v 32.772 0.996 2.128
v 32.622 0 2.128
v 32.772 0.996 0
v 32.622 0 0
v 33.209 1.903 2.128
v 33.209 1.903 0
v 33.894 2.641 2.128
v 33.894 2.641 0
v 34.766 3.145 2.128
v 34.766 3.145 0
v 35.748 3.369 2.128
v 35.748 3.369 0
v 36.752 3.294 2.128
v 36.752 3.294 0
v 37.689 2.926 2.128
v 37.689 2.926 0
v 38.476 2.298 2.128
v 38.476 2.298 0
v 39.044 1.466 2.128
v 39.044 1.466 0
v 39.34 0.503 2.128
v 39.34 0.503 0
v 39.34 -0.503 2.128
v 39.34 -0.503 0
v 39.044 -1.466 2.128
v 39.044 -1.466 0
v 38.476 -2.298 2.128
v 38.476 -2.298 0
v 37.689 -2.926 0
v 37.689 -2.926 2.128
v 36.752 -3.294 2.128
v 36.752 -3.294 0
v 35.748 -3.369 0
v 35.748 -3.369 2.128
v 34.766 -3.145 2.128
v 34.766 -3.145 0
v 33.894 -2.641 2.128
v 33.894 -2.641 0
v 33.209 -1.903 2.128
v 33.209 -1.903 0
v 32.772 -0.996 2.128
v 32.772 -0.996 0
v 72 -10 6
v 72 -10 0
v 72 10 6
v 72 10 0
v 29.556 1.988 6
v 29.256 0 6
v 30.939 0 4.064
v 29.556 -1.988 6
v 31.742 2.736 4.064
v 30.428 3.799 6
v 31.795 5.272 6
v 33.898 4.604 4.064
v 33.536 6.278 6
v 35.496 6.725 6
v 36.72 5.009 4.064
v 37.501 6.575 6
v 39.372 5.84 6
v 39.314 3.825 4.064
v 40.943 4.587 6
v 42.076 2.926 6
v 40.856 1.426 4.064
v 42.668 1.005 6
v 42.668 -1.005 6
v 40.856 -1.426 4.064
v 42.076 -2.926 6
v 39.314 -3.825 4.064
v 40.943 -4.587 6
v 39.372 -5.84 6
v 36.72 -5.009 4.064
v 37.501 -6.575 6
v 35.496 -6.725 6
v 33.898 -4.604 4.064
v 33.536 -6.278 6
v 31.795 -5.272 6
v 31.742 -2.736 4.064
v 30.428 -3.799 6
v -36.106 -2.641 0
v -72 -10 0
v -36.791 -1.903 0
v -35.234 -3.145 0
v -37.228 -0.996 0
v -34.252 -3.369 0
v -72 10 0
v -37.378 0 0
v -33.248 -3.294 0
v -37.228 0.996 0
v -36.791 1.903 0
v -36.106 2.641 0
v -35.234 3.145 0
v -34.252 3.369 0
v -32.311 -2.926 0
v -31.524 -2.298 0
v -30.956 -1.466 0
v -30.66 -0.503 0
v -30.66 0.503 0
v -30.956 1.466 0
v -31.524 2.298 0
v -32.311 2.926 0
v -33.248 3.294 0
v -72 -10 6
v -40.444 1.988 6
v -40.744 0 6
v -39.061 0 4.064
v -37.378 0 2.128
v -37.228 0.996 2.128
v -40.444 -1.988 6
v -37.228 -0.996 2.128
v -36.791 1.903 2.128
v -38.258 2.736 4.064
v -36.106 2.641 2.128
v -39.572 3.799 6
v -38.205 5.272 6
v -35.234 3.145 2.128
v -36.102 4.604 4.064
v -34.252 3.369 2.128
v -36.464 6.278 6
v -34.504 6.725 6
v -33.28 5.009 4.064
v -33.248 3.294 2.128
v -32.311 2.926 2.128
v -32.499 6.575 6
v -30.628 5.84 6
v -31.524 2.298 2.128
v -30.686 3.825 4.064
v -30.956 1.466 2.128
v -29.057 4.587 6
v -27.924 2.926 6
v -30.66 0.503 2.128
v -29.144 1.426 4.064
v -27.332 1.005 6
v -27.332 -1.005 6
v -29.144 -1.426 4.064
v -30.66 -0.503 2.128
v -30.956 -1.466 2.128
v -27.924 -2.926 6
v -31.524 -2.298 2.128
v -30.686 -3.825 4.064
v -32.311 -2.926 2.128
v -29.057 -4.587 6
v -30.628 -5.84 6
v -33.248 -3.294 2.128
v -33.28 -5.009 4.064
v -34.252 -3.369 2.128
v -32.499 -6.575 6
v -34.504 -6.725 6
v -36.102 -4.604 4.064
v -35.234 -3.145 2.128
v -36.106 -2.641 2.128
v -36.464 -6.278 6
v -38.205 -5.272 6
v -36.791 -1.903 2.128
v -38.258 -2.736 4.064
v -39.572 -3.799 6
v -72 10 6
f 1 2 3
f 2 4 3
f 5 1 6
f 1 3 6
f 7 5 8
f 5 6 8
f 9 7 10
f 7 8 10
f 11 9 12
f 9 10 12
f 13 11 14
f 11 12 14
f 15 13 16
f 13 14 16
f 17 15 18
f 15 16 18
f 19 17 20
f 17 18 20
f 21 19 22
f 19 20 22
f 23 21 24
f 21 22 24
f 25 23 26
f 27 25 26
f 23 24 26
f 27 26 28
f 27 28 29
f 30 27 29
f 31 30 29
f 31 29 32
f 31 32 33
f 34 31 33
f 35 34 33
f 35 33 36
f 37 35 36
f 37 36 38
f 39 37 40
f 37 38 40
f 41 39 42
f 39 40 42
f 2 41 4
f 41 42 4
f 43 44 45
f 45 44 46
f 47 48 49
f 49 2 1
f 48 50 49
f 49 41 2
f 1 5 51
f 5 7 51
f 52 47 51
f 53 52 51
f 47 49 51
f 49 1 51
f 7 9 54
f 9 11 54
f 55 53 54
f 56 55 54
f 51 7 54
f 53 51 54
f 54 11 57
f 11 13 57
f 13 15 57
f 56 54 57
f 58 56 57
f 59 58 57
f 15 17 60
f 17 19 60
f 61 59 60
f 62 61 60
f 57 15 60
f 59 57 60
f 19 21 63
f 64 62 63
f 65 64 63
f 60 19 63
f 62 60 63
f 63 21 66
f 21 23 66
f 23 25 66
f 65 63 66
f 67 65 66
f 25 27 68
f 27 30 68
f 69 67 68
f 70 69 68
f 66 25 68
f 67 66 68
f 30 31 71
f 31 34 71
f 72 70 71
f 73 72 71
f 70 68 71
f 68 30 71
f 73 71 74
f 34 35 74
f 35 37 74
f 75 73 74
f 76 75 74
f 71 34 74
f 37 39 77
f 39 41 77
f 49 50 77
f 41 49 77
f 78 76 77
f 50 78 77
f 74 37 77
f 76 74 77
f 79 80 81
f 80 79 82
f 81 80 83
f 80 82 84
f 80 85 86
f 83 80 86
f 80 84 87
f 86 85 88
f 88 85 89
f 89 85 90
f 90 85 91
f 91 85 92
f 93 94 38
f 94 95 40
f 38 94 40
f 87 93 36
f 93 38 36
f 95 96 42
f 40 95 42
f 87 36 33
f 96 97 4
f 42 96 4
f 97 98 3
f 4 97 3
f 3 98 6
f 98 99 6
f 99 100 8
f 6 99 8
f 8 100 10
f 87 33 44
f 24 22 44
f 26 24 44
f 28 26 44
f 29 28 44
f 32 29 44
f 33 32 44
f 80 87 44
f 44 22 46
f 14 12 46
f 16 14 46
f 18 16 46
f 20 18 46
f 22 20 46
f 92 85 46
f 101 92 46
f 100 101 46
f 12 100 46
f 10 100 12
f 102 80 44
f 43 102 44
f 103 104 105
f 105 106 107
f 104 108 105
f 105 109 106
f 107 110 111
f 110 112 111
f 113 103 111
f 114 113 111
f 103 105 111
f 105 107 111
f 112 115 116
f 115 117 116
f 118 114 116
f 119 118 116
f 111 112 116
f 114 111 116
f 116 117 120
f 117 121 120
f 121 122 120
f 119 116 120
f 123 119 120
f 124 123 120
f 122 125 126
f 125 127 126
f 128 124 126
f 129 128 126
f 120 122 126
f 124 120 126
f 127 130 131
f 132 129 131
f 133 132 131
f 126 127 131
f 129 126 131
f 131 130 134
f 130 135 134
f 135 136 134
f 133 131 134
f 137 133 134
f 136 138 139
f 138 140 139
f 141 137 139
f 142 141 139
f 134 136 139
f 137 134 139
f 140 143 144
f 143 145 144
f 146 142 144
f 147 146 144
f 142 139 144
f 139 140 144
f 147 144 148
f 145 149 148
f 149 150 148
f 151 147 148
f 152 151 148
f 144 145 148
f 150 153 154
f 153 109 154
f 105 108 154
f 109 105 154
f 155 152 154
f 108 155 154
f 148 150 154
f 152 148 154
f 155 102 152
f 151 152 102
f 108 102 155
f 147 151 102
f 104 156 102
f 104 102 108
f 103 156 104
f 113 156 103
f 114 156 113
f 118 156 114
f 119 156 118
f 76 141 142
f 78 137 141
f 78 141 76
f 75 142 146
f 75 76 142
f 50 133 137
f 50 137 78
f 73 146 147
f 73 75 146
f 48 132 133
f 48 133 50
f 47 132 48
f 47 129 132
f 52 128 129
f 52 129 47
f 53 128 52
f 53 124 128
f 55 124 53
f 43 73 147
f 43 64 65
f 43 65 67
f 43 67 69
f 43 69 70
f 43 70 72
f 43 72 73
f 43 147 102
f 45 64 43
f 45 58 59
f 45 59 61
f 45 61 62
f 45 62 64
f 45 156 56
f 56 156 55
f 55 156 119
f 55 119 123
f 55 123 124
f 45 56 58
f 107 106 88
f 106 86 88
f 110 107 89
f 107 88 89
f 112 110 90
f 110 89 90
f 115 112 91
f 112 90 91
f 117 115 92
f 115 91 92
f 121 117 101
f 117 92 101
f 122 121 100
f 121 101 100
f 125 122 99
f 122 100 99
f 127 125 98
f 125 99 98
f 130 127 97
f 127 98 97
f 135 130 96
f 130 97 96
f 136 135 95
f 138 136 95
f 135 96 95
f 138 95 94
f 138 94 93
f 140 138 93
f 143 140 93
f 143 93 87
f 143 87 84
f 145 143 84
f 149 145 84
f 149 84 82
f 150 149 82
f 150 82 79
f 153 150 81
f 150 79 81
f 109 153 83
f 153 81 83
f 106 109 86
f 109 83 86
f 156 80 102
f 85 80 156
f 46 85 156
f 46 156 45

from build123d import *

# Parameters (mm, degrees)
F0_W           = 144
F0_H           = 20
F1_DEPTH       = 6
F3_D           = 6.7564
F3_DEPTH       = 16.51
F3_CSINK_D     = 13.4874
F3_CSINK_ANGLE = 82


with BuildPart() as f1:
    # F0 (on Top) → F1 (new body)
    with BuildSketch(Plane.XY):
        Rectangle(F0_W, F0_H)
    extrude(amount=F1_DEPTH)

    # F3
    with Locations(Plane.XY.offset(6)):
        with Locations((-34, 0), (36, 0)):
            CounterSinkHole(F3_D / 2, F3_CSINK_D / 2, depth=F3_DEPTH, counter_sink_angle=F3_CSINK_ANGLE)


solid = f1.part
